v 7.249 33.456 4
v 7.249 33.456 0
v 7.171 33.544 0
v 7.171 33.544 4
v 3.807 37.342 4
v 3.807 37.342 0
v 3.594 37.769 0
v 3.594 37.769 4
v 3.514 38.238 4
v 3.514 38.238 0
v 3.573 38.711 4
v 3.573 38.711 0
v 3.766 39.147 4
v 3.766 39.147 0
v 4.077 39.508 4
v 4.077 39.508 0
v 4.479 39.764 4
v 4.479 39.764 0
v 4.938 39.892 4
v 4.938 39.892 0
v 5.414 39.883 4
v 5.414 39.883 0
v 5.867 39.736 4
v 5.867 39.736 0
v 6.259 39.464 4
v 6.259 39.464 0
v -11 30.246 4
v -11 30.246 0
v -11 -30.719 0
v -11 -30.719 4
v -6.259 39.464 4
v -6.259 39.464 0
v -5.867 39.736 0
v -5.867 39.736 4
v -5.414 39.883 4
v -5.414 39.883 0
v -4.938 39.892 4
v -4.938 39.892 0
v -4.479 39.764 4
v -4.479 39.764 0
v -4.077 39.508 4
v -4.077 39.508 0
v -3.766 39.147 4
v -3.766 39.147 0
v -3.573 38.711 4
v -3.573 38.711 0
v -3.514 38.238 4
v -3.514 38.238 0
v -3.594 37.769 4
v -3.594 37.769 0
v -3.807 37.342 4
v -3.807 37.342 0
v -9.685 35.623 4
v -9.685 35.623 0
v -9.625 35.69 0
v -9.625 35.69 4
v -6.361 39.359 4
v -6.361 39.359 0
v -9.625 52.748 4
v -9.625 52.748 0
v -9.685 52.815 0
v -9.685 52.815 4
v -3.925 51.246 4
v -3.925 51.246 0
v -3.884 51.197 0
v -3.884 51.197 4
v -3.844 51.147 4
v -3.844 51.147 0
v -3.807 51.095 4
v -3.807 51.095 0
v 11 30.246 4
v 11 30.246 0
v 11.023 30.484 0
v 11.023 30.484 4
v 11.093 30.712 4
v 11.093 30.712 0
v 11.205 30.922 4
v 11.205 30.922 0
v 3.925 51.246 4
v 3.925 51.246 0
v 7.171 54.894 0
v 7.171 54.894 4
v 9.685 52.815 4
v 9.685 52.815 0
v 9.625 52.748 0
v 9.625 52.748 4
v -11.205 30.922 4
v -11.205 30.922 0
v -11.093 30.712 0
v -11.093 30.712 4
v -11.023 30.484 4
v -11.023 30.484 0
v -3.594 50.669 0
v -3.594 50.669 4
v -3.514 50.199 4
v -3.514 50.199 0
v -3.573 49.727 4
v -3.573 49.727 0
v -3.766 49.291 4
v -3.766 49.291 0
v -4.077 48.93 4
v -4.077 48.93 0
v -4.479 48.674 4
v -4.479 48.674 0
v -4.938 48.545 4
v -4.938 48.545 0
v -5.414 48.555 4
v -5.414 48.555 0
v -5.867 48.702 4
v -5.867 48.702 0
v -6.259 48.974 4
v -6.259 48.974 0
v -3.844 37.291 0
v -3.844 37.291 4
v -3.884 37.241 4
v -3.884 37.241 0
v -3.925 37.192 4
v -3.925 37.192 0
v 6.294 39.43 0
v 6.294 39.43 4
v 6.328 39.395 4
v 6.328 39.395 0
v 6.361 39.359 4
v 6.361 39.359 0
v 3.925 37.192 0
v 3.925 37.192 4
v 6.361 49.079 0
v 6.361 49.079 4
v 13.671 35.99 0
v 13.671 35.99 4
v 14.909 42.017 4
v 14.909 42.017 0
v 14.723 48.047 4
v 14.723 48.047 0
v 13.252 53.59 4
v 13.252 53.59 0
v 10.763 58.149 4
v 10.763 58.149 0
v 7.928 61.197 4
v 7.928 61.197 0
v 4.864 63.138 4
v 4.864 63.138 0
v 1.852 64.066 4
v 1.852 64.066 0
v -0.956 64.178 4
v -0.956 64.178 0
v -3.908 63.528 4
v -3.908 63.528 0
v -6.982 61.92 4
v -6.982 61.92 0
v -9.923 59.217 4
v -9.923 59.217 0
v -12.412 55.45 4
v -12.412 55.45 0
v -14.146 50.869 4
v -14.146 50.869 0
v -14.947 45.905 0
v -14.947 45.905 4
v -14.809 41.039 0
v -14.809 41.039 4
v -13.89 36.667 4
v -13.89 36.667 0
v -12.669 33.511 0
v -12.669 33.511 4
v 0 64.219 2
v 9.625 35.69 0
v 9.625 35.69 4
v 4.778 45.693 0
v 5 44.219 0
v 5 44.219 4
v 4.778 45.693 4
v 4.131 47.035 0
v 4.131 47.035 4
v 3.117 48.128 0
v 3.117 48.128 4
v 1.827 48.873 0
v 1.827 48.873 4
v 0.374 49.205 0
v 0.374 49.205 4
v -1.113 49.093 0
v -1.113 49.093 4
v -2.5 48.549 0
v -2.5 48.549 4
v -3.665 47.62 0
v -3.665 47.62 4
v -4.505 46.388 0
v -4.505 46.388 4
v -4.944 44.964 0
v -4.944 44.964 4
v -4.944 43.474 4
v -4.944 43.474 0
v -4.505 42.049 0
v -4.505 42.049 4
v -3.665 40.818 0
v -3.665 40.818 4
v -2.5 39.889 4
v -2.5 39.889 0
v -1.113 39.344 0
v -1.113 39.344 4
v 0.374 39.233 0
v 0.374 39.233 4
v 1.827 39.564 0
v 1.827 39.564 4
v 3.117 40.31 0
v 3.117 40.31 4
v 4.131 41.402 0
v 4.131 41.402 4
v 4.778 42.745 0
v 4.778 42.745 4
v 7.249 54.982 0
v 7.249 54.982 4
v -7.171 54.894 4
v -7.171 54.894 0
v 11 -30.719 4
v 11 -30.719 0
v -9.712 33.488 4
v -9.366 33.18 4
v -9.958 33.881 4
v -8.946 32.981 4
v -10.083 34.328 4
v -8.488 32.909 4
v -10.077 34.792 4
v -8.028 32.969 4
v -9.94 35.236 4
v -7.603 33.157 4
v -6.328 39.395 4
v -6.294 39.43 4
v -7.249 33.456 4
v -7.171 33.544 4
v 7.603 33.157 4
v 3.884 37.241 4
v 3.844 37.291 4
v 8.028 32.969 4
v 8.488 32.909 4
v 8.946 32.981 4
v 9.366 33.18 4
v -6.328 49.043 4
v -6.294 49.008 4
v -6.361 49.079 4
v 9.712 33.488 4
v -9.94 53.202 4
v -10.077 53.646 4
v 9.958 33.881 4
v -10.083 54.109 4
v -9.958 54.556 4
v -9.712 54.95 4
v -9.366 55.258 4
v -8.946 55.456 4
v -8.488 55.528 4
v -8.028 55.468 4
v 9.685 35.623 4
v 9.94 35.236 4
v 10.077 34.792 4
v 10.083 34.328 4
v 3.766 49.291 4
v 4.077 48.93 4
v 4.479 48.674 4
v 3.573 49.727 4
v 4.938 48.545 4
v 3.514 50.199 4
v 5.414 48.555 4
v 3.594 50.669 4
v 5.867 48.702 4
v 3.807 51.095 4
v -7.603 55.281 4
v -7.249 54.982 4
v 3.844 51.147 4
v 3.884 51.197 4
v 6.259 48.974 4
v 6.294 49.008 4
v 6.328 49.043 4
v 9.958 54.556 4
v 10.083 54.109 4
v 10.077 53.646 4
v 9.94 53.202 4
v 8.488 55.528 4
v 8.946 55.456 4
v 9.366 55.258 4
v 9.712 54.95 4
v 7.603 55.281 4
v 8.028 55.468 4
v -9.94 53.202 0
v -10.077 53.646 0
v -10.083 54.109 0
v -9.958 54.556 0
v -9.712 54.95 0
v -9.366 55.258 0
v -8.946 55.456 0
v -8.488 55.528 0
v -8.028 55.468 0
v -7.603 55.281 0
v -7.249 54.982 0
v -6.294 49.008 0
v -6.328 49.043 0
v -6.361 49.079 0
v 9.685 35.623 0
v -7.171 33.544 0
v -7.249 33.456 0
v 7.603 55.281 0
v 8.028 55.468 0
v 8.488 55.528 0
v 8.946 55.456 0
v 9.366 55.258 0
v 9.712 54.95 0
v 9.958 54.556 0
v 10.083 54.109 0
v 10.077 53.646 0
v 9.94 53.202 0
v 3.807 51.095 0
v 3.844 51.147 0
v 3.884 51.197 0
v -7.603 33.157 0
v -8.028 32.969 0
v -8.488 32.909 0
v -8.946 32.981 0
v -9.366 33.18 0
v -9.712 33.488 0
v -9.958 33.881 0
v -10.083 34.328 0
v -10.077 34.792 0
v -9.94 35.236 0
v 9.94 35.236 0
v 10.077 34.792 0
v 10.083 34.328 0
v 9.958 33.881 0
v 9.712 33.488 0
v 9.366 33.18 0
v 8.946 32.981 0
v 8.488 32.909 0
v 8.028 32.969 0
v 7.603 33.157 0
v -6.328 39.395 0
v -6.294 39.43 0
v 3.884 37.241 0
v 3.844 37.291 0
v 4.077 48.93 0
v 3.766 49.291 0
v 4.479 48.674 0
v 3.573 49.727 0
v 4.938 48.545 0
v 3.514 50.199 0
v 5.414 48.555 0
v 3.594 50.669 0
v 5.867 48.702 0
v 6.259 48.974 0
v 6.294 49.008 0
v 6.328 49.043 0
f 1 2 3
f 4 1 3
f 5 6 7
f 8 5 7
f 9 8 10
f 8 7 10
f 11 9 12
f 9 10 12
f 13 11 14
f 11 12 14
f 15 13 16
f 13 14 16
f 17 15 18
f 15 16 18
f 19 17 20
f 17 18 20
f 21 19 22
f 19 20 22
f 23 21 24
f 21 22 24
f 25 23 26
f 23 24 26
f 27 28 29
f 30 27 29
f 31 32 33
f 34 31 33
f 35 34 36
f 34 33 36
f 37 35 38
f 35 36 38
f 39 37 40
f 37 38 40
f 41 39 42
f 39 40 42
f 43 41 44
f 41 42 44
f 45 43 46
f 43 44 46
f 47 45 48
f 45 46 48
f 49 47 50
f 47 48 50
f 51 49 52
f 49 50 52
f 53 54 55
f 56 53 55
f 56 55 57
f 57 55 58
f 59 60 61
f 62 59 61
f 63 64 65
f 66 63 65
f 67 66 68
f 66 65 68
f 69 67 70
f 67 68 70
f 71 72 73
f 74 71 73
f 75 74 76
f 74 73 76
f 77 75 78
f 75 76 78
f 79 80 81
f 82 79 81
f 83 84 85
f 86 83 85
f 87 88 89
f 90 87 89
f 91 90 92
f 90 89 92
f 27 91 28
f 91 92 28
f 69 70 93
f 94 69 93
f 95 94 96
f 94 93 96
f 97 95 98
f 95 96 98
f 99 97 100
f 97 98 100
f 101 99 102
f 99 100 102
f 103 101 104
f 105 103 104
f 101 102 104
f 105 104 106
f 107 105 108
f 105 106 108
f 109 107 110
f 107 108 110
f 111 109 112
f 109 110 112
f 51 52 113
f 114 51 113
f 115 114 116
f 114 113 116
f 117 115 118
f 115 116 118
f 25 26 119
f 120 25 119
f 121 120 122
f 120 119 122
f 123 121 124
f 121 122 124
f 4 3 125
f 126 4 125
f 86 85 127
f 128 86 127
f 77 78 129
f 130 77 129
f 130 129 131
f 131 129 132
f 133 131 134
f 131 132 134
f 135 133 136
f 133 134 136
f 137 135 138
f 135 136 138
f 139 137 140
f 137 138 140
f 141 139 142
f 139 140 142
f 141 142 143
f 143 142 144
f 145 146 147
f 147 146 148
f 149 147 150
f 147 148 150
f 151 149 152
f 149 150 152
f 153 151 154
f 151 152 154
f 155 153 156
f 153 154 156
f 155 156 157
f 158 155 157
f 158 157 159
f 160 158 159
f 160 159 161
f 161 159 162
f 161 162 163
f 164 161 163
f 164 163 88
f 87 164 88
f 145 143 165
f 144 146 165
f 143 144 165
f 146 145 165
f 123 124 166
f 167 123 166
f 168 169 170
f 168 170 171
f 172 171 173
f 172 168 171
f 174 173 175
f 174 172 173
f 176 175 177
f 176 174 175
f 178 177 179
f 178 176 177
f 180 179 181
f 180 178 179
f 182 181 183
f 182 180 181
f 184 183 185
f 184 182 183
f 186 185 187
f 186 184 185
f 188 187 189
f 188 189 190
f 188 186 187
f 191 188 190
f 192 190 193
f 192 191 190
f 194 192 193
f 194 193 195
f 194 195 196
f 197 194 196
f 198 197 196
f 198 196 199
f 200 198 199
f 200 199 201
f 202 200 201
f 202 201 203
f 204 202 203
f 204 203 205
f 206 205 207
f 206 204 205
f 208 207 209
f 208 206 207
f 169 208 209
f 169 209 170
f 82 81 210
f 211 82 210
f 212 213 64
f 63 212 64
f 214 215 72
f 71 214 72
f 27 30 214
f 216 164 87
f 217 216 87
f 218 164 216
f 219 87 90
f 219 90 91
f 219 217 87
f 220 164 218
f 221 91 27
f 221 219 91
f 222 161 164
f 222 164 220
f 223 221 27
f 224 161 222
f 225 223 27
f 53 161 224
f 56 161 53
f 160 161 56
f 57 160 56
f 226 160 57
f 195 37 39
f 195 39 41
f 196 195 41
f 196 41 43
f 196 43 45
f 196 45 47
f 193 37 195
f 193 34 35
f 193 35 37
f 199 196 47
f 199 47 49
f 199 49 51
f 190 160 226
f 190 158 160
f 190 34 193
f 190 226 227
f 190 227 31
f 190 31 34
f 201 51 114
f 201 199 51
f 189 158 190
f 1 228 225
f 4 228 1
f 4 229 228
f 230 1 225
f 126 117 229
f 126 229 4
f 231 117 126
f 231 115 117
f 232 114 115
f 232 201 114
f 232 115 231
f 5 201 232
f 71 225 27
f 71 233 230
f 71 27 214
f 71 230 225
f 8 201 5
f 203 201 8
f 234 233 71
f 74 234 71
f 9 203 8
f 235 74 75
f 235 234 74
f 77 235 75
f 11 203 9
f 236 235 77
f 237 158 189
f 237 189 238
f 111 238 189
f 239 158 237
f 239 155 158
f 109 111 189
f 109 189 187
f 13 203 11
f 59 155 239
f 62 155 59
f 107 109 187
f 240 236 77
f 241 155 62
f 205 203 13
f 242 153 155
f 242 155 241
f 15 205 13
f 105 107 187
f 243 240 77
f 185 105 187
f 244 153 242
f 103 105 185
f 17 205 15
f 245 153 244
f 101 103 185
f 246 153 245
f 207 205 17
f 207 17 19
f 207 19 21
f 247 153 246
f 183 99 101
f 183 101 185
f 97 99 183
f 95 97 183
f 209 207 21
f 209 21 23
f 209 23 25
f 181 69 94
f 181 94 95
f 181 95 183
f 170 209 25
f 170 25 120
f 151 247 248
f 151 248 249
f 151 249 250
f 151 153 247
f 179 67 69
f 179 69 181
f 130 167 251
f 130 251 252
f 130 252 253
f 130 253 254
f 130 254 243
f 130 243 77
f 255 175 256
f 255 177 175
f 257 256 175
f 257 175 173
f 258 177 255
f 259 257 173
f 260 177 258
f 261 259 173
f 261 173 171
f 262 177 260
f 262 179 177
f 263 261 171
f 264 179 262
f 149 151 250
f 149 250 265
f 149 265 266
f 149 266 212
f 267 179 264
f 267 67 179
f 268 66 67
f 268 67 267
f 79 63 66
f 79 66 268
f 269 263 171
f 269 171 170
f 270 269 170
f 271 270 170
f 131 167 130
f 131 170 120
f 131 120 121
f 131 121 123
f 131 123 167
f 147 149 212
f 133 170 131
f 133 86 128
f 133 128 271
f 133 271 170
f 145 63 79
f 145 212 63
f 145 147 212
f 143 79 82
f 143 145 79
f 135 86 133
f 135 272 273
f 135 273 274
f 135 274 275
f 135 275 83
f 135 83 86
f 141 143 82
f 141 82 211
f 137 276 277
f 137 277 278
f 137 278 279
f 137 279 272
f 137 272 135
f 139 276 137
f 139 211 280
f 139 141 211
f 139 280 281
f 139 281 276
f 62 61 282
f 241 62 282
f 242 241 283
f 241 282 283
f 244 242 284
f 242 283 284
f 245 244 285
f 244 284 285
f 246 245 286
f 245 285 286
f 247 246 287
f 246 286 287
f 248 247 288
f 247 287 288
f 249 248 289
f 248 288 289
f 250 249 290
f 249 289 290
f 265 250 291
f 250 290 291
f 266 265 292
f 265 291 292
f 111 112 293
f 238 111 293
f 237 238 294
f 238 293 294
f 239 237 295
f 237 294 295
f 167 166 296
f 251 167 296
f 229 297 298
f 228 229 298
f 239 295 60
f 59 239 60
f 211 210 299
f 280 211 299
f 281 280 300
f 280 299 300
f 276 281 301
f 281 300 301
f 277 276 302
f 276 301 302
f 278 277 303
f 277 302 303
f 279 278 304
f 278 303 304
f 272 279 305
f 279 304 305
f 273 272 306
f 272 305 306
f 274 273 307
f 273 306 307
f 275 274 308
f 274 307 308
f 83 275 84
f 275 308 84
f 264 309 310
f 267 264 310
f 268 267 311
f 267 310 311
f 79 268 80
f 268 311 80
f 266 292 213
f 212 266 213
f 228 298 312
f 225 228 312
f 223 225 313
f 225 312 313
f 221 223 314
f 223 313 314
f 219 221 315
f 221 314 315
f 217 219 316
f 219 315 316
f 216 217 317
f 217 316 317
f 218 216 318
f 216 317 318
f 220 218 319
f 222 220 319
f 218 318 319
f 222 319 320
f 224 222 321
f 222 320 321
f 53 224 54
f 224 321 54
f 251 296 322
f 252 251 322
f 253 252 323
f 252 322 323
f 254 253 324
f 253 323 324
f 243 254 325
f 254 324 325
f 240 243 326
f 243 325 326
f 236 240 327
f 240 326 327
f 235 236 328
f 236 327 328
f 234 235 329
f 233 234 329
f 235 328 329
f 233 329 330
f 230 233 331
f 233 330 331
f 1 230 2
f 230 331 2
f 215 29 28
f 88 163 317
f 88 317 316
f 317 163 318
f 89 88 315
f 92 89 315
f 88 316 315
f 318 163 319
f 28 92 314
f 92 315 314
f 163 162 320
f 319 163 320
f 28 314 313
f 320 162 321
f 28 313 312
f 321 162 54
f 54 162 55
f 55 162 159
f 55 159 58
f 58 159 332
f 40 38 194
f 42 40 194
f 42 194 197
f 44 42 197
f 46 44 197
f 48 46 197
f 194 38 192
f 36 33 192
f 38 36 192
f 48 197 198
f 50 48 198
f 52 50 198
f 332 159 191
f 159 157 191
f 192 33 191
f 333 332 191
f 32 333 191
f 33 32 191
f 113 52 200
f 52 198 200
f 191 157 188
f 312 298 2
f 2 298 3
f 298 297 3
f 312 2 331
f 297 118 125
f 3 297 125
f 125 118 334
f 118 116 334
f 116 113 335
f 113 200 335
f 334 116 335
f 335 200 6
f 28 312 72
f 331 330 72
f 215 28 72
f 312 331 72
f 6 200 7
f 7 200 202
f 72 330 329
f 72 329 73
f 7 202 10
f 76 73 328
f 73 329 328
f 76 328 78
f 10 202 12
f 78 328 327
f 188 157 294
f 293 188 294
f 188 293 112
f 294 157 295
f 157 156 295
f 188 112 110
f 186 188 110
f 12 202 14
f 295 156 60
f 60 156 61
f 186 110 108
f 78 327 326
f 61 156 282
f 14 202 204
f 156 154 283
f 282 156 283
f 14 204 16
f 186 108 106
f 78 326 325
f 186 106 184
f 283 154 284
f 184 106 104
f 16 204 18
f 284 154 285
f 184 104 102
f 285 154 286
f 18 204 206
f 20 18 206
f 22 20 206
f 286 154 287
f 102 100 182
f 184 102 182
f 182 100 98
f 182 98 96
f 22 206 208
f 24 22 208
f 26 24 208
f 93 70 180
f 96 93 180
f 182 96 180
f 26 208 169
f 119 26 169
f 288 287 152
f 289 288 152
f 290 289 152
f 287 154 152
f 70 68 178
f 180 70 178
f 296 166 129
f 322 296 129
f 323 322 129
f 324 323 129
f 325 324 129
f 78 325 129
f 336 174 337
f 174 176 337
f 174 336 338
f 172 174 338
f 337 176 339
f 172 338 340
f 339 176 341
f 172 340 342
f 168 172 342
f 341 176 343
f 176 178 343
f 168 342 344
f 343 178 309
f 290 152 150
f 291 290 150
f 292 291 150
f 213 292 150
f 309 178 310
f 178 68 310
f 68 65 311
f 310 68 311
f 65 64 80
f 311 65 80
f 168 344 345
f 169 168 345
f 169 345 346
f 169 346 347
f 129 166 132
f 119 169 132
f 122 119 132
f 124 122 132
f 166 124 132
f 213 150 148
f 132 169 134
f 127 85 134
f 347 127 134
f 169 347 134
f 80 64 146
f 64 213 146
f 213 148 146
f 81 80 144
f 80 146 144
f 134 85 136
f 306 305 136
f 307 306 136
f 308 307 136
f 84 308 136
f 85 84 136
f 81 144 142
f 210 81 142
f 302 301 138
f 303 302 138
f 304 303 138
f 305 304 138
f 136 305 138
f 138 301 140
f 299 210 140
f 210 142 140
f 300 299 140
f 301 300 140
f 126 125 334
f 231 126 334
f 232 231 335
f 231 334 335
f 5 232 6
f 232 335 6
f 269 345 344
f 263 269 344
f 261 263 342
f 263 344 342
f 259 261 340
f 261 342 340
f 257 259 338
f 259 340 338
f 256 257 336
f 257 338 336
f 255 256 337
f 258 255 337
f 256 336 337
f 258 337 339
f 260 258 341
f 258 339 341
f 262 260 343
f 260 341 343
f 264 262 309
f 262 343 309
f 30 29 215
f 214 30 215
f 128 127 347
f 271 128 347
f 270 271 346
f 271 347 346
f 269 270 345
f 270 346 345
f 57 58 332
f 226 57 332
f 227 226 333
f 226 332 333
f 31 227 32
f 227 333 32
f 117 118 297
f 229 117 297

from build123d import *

# Parameters (mm, degrees)
F0_R     = 5
F1_DEPTH = 4


with BuildPart() as f1:
    # F0 (on Top) → F1 (new body)
    with BuildSketch(Plane.XY):
        with BuildLine():
            Line((-11, -30.7188350707), (11, -30.7188350707))
            Line((11, -30.7188350707), (11, 30.2462431125))
            ThreePointArc((11, 30.2462431125), (11.0523412572, 30.5993794996), (11.2048644339, 30.922151239))
            add(Edge.make_bspline(
                [(11.2048644339, 30.922151239), (33.4308099235, 64.2188350707), (0, 64.2188350707), (-33.4308099235, 64.2188350707), (-11.2048644339, 30.922151239)],
                knots=[0.8435244992, 0.8435244992, 0.8435244992, 3.1415926536, 3.1415926536, 5.439660808, 5.439660808, 5.439660808], degree=2, weights=[1, 0.4093689097, 1, 0.4093689097, 1]))
            ThreePointArc((-11.2048644339, 30.922151239), (-11.0523412572, 30.5993794996), (-11, 30.2462431125))
            Line((-11, 30.2462431125), (-11, -30.7188350707))
        make_face()
        with BuildLine():
            ThreePointArc((9.6845585642, 35.6225271335), (9.5499827392, 33.3212906512), (7.248746257, 33.4558664762))
            Line((7.248746257, 33.4558664762), (7.1707048968, 33.5436024605))
            ThreePointArc((7.1707048968, 33.5436024605), (0, 31.3588350707), (-7.1707048968, 33.5436024605))
            Line((-7.1707048968, 33.5436024605), (-7.248746257, 33.4558664762))
            ThreePointArc((-7.248746257, 33.4558664762), (-9.5499827392, 33.3212906512), (-9.6845585642, 35.6225271335))
            Line((-9.6845585642, 35.6225271335), (-9.624717664, 35.6898017206))
            ThreePointArc((-9.624717664, 35.6898017206), (-12.86, 44.2188350707), (-9.624717664, 52.7478684209))
            Line((-9.624717664, 52.7478684209), (-9.6845585642, 52.815143008))
            ThreePointArc((-9.6845585642, 52.815143008), (-9.5499827392, 55.1163794902), (-7.248746257, 54.9818036653))
            Line((-7.248746257, 54.9818036653), (-7.1707048968, 54.894067681))
            ThreePointArc((-7.1707048968, 54.894067681), (0, 57.0788350707), (7.1707048968, 54.894067681))
            Line((7.1707048968, 54.894067681), (7.248746257, 54.9818036653))
            ThreePointArc((7.248746257, 54.9818036653), (9.5499827392, 55.1163794902), (9.6845585642, 52.815143008))
            Line((9.6845585642, 52.815143008), (9.624717664, 52.7478684209))
            ThreePointArc((9.624717664, 52.7478684209), (12.0240065943, 48.7798509028), (12.86, 44.2188350707))
            ThreePointArc((12.86, 44.2188350707), (12.0240065943, 39.6578192387), (9.624717664, 35.6898017206))
            Line((9.624717664, 35.6898017206), (9.6845585642, 35.6225271335))
        make_face(mode=Mode.SUBTRACT)
        with BuildLine():
            ThreePointArc((-7.1707048968, 33.5436024605), (0, 31.3588350707), (7.1707048968, 33.5436024605))
            Line((7.1707048968, 33.5436024605), (3.9254583381, 37.1919871215))
            ThreePointArc((3.9254583381, 37.1919871215), (3.8639458478, 37.26537293), (3.8068487765, 37.3422441717))
            ThreePointArc((3.8068487765, 37.3422441717), (0, 36.3588350707), (-3.8068487765, 37.3422441717))
            ThreePointArc((-3.8068487765, 37.3422441717), (-3.8639458478, 37.26537293), (-3.9254583381, 37.1919871215))
            Line((-3.9254583381, 37.1919871215), (-7.1707048968, 33.5436024605))
        make_face()
        with BuildLine():
            Line((6.3612706453, 39.3586477788), (9.624717664, 35.6898017206))
            ThreePointArc((9.624717664, 35.6898017206), (12.0240065943, 39.6578192387), (12.86, 44.2188350707))
            ThreePointArc((12.86, 44.2188350707), (12.0240065943, 48.7798509028), (9.624717664, 52.7478684209))
            Line((9.624717664, 52.7478684209), (6.3612706453, 49.0790223626))
            ThreePointArc((6.3612706453, 49.0790223626), (6.3111659865, 49.0251897001), (6.2586841305, 48.9736718665))
            ThreePointArc((6.2586841305, 48.9736718665), (7.4489213067, 46.7274544853), (7.86, 44.2188350707))
            ThreePointArc((7.86, 44.2188350707), (7.4489213067, 41.7102156562), (6.2586841305, 39.463998275))
            ThreePointArc((6.2586841305, 39.463998275), (6.3111659865, 39.4124804414), (6.3612706453, 39.3586477788))
        make_face()
        with BuildLine():
            ThreePointArc((-9.624717664, 52.7478684209), (-12.86, 44.2188350707), (-9.624717664, 35.6898017206))
            Line((-9.624717664, 35.6898017206), (-6.3612706453, 39.3586477788))
            ThreePointArc((-6.3612706453, 39.3586477788), (-6.3111659865, 39.4124804414), (-6.2586841305, 39.463998275))
            ThreePointArc((-6.2586841305, 39.463998275), (-7.86, 44.2188350707), (-6.2586841305, 48.9736718665))
            ThreePointArc((-6.2586841305, 48.9736718665), (-6.3111659865, 49.0251897001), (-6.3612706453, 49.0790223626))
            Line((-6.3612706453, 49.0790223626), (-9.624717664, 52.7478684209))
        make_face()
        with BuildLine():
            Line((3.9254583381, 51.2456830199), (7.1707048968, 54.894067681))
            ThreePointArc((7.1707048968, 54.894067681), (0, 57.0788350707), (-7.1707048968, 54.894067681))
            Line((-7.1707048968, 54.894067681), (-3.9254583381, 51.2456830199))
            ThreePointArc((-3.9254583381, 51.2456830199), (-3.8639458478, 51.1722972114), (-3.8068487765, 51.0954259698))
            ThreePointArc((-3.8068487765, 51.0954259698), (0, 52.0788350707), (3.8068487765, 51.0954259698))
            ThreePointArc((3.8068487765, 51.0954259698), (3.8639458478, 51.1722972114), (3.9254583381, 51.2456830199))
        make_face()
        with BuildLine():
            ThreePointArc((-3.8068487765, 37.3422441717), (0, 36.3588350707), (3.8068487765, 37.3422441717))
            ThreePointArc((3.8068487765, 37.3422441717), (4.0767380131, 39.5078789924), (6.2586841305, 39.463998275))
            ThreePointArc((6.2586841305, 39.463998275), (7.4489213067, 41.7102156562), (7.86, 44.2188350707))
            ThreePointArc((7.86, 44.2188350707), (7.4489213067, 46.7274544853), (6.2586841305, 48.9736718665))
            ThreePointArc((6.2586841305, 48.9736718665), (4.0767380131, 48.9297911491), (3.8068487765, 51.0954259698))
            ThreePointArc((3.8068487765, 51.0954259698), (0, 52.0788350707), (-3.8068487765, 51.0954259698))
            ThreePointArc((-3.8068487765, 51.0954259698), (-4.0767380131, 48.9297911491), (-6.2586841305, 48.9736718665))
            ThreePointArc((-6.2586841305, 48.9736718665), (-7.86, 44.2188350707), (-6.2586841305, 39.463998275))
            ThreePointArc((-6.2586841305, 39.463998275), (-4.0767380131, 39.5078789924), (-3.8068487765, 37.3422441717))
        make_face()
        with Locations((0, 44.2188350707)):
            Circle(F0_R, mode=Mode.SUBTRACT)
    extrude(amount=F1_DEPTH)


solid = f1.part
